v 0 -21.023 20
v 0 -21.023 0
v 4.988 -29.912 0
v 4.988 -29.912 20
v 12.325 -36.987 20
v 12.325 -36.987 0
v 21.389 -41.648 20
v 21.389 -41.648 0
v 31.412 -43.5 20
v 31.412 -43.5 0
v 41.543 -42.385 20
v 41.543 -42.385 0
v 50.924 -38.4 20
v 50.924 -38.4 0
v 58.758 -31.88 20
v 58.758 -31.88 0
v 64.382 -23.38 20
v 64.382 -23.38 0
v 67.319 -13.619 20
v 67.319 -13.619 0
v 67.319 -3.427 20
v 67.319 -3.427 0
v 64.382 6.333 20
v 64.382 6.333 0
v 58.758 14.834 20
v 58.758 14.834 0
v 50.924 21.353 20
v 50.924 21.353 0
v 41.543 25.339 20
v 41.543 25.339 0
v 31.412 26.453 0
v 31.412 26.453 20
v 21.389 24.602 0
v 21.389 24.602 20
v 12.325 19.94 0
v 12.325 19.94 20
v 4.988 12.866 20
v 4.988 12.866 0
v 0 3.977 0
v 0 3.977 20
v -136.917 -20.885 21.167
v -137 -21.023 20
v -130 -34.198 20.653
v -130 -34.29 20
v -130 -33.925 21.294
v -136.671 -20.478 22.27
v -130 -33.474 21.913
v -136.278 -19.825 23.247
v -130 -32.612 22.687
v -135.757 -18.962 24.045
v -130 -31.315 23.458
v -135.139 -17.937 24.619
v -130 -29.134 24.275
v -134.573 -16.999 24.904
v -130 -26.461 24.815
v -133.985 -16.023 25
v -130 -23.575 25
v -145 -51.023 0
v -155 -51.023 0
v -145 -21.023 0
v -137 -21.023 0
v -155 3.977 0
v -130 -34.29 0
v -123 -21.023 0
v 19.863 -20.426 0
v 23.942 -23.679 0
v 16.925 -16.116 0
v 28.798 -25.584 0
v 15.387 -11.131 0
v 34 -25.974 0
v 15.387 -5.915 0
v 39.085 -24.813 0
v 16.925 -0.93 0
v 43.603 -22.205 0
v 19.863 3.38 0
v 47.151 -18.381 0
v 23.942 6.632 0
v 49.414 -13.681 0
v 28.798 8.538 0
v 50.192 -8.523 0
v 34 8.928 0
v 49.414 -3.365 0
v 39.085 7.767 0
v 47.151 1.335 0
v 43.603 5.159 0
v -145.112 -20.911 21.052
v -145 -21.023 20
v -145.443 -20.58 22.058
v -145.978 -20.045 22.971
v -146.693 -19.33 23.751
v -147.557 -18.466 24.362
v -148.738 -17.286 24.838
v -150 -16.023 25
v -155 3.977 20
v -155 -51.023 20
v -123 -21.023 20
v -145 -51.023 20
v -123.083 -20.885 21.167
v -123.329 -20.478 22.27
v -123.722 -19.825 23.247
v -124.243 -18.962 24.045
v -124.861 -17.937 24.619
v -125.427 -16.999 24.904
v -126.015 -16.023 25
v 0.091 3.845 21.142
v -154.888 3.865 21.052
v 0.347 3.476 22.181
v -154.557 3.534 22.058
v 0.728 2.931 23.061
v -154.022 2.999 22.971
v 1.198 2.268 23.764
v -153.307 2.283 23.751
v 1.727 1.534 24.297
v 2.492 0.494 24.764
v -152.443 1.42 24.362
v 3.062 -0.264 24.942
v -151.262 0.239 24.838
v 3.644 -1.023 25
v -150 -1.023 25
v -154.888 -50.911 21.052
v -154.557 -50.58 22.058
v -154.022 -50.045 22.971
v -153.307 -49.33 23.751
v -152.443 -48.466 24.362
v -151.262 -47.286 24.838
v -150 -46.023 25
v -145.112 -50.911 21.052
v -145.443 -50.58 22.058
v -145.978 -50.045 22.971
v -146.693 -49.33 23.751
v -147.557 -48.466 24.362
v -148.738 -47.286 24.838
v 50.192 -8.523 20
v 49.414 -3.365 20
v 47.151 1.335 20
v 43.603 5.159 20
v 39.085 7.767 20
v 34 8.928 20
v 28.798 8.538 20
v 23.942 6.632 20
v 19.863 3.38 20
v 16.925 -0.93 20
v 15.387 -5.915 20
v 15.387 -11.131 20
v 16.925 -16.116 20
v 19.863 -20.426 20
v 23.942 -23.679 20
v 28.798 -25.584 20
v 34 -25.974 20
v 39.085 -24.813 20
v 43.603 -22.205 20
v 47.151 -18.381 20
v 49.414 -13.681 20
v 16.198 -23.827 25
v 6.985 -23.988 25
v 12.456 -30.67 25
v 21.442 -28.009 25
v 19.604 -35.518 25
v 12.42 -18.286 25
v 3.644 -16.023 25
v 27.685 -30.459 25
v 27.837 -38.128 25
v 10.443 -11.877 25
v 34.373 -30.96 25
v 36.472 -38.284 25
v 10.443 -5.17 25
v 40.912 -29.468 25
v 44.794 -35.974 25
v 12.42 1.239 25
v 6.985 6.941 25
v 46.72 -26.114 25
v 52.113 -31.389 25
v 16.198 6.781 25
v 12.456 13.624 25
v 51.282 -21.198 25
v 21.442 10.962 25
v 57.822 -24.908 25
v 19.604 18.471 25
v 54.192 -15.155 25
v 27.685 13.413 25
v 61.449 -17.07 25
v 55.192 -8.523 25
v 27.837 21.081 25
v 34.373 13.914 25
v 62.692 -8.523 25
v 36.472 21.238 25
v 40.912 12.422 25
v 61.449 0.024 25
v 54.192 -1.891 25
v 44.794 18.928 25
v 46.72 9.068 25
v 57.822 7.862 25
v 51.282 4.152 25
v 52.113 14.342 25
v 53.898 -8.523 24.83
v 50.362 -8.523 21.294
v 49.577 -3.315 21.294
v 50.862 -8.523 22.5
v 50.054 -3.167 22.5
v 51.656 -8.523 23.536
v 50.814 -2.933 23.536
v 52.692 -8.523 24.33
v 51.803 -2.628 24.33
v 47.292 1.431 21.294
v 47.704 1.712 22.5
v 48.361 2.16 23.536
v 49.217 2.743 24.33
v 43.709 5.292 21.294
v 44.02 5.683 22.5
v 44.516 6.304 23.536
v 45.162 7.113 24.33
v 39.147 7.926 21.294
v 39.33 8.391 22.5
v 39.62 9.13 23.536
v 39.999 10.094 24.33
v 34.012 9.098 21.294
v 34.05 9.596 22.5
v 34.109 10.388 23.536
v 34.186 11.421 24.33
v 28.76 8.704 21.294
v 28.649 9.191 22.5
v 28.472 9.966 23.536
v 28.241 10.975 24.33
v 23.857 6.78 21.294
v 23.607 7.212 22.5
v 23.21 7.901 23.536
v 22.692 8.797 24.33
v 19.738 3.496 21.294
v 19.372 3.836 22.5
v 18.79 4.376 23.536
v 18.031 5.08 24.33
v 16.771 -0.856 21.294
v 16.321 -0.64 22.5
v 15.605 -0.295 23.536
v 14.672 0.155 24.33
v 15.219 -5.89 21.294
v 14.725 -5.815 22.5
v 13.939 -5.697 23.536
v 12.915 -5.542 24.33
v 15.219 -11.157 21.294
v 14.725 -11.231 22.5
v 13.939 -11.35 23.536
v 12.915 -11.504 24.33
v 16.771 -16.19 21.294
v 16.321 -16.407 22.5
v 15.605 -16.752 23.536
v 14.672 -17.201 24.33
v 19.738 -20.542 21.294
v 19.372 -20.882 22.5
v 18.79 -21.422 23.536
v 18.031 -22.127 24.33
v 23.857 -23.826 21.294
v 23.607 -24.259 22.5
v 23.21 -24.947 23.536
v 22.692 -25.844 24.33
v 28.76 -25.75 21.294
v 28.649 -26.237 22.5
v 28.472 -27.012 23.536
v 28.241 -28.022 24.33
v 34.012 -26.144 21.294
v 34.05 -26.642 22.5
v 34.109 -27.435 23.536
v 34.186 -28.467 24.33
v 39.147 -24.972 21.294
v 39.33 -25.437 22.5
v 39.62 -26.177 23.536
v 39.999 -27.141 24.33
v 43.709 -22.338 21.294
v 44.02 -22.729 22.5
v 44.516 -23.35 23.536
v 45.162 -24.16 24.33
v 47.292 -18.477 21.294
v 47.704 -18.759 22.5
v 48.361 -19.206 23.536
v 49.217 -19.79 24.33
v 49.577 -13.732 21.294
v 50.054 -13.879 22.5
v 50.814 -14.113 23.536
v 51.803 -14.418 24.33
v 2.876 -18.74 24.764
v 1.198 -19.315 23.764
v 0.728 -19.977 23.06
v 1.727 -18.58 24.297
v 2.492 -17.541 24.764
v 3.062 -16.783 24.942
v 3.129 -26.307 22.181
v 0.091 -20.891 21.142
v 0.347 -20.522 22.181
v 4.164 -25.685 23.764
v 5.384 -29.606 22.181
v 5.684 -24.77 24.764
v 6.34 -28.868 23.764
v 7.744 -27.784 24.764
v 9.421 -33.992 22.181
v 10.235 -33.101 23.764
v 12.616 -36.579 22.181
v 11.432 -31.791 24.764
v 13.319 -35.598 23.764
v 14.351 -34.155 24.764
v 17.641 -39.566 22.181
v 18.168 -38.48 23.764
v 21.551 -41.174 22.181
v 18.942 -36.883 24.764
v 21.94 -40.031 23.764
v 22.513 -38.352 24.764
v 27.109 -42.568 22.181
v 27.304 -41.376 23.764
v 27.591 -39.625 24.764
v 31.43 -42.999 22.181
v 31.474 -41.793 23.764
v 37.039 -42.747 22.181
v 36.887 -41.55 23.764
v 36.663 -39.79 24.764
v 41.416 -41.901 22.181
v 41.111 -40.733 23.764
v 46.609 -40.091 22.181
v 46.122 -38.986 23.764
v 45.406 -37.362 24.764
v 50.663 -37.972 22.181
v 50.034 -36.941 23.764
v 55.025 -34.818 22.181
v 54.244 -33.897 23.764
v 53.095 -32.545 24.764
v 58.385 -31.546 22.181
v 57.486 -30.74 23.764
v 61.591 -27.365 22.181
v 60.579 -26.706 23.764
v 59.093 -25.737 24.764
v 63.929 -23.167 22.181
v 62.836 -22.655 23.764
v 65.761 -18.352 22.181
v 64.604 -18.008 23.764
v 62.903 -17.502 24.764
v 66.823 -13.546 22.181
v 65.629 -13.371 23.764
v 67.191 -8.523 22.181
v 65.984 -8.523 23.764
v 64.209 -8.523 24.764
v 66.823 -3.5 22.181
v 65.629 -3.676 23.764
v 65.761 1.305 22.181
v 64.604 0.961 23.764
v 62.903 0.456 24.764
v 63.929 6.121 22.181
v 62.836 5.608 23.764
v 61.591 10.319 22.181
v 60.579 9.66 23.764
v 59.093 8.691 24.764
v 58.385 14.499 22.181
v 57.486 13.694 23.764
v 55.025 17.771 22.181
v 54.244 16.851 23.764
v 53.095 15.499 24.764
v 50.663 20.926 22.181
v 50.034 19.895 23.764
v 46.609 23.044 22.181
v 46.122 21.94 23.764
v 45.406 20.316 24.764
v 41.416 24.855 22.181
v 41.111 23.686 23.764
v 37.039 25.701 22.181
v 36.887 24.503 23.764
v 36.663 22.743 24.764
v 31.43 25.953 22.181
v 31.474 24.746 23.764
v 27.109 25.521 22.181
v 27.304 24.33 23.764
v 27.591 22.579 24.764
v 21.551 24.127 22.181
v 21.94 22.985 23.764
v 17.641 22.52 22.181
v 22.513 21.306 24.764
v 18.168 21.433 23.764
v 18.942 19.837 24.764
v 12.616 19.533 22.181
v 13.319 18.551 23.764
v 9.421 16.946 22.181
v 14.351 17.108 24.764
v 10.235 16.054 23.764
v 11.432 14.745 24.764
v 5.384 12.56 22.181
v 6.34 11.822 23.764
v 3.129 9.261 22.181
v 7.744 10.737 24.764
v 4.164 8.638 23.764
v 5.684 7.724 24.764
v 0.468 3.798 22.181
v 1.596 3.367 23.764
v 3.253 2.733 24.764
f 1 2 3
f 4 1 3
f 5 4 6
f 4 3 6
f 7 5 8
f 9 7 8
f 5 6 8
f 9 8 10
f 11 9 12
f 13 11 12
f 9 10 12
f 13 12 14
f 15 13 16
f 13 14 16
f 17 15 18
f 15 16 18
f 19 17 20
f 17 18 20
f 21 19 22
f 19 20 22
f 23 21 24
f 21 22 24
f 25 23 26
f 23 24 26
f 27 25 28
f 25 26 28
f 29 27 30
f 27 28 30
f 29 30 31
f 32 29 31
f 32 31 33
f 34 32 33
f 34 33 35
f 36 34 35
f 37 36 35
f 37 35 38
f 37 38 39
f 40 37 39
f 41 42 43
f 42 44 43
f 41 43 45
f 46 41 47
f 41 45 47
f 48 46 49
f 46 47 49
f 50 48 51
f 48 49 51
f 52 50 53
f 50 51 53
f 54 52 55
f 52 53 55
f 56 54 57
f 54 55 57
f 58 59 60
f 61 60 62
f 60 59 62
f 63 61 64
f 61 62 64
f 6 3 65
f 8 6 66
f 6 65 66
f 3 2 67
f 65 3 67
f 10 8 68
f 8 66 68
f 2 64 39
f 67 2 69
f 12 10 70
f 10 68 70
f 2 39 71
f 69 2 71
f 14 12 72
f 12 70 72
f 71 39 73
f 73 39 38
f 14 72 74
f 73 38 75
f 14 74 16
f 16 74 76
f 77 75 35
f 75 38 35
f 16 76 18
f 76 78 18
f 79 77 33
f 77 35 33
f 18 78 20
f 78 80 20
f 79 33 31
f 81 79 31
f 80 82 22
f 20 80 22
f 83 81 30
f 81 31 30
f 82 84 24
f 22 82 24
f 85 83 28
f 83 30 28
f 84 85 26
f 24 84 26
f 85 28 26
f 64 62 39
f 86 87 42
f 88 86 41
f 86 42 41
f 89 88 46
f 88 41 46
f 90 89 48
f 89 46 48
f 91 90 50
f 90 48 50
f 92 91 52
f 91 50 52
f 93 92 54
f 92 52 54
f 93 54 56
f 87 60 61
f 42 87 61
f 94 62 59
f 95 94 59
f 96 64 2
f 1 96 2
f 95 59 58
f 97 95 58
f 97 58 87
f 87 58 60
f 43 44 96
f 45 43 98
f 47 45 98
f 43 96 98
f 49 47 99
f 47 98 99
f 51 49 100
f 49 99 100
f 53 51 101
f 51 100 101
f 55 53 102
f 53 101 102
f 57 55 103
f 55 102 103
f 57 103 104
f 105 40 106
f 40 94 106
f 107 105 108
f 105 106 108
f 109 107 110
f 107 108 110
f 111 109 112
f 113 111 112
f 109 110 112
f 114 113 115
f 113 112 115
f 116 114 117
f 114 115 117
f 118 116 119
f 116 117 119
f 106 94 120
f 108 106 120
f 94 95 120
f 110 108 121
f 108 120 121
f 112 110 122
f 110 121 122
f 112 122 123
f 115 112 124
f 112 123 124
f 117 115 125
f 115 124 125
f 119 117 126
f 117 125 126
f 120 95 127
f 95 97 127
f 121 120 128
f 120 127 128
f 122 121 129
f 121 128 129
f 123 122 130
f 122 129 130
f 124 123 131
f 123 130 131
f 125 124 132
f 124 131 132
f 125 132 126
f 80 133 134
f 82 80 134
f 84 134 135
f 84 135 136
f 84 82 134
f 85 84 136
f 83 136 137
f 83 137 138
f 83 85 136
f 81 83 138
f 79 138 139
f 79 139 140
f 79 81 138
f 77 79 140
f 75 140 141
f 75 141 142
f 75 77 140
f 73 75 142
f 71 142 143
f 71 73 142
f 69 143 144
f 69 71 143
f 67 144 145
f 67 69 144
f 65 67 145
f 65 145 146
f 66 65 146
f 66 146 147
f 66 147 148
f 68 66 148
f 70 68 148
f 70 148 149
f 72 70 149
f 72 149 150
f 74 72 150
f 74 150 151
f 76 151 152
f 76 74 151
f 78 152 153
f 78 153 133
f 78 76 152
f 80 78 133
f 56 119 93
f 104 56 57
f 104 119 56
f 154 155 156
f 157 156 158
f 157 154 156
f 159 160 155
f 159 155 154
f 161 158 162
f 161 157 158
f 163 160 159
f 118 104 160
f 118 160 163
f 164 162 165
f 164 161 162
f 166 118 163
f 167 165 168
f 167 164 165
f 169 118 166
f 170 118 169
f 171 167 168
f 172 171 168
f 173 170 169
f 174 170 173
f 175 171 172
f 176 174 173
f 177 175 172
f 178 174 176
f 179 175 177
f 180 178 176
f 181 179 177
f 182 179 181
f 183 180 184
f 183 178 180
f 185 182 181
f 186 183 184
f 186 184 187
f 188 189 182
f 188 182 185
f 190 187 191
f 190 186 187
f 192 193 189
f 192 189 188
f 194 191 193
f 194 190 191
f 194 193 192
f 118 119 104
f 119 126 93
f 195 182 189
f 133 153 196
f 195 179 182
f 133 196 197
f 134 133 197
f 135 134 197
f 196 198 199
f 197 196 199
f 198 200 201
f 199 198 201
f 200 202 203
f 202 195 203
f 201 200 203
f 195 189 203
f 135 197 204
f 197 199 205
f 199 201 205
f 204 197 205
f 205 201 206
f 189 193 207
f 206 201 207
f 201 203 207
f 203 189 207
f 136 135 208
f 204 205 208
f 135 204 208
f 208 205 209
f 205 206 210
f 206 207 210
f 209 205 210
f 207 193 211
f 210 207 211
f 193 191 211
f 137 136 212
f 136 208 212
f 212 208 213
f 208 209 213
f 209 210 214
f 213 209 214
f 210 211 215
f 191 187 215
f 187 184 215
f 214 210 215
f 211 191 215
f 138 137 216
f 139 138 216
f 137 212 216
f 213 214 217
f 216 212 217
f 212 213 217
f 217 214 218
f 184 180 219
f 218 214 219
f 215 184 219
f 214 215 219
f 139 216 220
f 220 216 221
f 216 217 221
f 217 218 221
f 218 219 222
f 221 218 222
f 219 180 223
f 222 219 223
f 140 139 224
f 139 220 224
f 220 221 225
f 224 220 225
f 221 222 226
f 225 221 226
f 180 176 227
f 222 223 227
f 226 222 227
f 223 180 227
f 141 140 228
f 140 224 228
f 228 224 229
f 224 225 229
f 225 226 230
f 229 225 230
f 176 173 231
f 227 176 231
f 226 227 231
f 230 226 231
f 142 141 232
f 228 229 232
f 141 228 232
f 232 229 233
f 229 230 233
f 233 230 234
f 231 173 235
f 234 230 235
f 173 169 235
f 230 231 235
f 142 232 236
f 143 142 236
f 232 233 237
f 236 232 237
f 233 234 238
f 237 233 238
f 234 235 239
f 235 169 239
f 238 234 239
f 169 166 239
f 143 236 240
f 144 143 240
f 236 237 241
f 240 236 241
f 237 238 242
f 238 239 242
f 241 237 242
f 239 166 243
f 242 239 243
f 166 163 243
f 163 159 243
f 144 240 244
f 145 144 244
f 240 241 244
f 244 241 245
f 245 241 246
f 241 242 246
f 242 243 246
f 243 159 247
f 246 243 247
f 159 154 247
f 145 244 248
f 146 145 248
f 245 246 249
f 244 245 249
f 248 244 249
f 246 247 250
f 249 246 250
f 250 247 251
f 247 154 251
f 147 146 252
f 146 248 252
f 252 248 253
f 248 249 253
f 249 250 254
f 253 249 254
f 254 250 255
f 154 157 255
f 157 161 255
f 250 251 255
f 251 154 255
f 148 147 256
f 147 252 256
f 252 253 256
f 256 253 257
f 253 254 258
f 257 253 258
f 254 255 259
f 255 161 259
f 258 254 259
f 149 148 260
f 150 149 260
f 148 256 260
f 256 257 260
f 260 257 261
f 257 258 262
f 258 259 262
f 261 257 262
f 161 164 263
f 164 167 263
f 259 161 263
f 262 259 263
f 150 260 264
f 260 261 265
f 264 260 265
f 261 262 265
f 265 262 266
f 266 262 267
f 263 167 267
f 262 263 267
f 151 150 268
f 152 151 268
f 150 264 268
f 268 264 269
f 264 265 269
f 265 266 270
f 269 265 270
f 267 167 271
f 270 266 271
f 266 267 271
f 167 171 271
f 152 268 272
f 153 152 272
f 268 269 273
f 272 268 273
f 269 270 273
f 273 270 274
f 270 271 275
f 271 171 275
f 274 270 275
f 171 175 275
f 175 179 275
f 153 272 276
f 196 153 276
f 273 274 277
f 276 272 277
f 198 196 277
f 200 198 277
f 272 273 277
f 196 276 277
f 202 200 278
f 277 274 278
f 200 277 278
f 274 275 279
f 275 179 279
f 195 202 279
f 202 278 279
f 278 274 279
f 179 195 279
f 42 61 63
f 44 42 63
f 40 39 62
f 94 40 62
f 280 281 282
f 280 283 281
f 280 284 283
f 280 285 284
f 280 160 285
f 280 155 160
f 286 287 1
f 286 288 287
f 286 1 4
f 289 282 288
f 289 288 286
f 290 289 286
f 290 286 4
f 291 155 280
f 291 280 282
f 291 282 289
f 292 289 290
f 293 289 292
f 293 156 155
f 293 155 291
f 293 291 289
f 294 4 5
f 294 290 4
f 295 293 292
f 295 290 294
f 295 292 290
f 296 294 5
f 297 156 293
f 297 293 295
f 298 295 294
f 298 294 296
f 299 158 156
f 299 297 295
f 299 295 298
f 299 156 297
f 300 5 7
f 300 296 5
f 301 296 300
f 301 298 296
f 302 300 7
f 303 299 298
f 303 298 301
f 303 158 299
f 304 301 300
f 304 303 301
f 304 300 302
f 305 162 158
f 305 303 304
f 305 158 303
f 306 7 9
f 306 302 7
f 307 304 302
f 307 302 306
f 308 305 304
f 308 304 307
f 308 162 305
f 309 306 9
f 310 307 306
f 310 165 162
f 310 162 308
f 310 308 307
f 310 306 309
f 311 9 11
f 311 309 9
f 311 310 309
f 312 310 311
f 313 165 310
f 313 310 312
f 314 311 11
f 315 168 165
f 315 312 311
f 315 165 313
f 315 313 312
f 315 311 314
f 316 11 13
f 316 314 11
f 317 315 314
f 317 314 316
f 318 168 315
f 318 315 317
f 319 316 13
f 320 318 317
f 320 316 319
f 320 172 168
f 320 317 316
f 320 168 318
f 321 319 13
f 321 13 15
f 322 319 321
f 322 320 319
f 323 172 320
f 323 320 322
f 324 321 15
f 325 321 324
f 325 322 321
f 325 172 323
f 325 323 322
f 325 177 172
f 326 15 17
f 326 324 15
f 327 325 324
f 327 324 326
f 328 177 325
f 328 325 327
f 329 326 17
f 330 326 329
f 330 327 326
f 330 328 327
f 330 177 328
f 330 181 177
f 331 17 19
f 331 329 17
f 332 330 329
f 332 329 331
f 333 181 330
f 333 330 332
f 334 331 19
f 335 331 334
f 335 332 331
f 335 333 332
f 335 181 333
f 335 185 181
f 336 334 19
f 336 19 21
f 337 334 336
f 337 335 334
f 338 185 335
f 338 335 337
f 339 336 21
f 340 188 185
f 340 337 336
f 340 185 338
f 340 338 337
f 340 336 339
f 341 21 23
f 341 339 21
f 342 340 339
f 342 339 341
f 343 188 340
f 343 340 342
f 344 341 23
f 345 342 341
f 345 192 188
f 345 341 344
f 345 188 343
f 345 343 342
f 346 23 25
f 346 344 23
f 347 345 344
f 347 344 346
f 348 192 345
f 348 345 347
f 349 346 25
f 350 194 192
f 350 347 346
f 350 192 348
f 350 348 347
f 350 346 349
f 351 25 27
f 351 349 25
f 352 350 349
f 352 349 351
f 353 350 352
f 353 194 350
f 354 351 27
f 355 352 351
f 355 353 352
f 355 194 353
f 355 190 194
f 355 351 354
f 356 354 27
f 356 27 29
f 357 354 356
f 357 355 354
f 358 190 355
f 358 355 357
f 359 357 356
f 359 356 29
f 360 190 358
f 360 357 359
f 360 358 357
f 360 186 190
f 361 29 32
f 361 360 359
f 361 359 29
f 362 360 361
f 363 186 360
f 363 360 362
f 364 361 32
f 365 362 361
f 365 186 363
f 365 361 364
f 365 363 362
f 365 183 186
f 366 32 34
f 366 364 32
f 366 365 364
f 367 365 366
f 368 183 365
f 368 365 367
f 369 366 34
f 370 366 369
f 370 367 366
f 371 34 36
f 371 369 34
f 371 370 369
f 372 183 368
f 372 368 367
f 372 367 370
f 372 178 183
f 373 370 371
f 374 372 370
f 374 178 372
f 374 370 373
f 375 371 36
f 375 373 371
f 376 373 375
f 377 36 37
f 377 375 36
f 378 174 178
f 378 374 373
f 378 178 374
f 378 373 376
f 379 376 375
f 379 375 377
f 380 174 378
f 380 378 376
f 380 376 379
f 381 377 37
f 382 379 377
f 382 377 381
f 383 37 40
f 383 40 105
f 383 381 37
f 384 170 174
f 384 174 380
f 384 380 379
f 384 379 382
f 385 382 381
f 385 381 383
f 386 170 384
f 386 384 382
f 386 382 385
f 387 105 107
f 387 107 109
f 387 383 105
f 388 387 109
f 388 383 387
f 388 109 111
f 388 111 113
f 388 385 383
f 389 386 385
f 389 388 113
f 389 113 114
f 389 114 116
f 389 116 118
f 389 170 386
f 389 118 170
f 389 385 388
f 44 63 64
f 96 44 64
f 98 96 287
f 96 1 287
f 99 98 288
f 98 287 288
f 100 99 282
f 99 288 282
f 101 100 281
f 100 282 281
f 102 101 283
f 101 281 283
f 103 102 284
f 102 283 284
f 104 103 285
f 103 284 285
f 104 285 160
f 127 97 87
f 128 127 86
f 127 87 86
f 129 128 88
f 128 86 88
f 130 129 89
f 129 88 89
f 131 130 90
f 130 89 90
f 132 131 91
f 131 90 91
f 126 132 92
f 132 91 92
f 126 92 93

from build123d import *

# Parameters (mm, degrees)
F0_R     = 17.5
F0_W     = 8
F0_H     = 15
F1_DEPTH = 25
F2_R     = 4.99999


# Not quite as in the source:
# - a fillet or chamfer is up to 0.001 mm smaller than in the source, because OpenCascade refuses the exact size


with BuildPart() as f1:
    # F0 (on Top) → F1 (new body)
    with BuildSketch(Plane.XY):
        with BuildLine():
            Line((0, 3.9768594503), (-155, 3.9768594503))
            Line((-155, 3.9768594503), (-155, -21.0231405497))
            Line((-155, -21.0231405497), (-147, -21.0231405497))
            Line((-147, -21.0231405497), (-145, -21.0231405497))
            Line((-145, -21.0231405497), (-137, -21.0231405497))
            Line((-137, -21.0231405497), (-123, -21.0231405497))
            Line((-123, -21.0231405497), (0, -21.0231405497))
            ThreePointArc((0, -21.0231405497), (67.6917420766, -8.5231405497), (0, 3.9768594503))
        make_face()
        with Locations((32.6917420766, -8.5231405497)):
            Circle(F0_R, mode=Mode.SUBTRACT)
        with Locations((-151, -28.5231405497)):
            Rectangle(F0_W, F0_H)
        Polygon((-145, -21.0231405497), (-147, -21.0231405497), (-147, -36.0231405497), (-155, -36.0231405497), (-155, -51.0231405497), (-145, -51.0231405497), align=None)
        Polygon((-130, -34.2896397111), (-123, -21.0231405497), (-137, -21.0231405497), align=None)
    extrude(amount=F1_DEPTH)

    # F2 (radius 5 in the source; OpenCascade refuses exactly that, so slightly less here)
    f2_edges = [f1.edges().sort_by_distance(p)[0] for p in [
        (-77.5, 3.976859, 25),
        (-61.5, -21.023141, 25),
        (-133.5, -27.65639, 25),
        (-155, -23.523141, 25),
        (-145, -36.023141, 25),
        (67.691742, -8.523141, 25),
        (-150, -51.023141, 25),
        (-141, -21.023141, 25),
        (-126.5, -27.65639, 25),
        (15.191742, -8.523141, 25),
    ]]
    fillet(f2_edges, radius=F2_R)


solid = f1.part
